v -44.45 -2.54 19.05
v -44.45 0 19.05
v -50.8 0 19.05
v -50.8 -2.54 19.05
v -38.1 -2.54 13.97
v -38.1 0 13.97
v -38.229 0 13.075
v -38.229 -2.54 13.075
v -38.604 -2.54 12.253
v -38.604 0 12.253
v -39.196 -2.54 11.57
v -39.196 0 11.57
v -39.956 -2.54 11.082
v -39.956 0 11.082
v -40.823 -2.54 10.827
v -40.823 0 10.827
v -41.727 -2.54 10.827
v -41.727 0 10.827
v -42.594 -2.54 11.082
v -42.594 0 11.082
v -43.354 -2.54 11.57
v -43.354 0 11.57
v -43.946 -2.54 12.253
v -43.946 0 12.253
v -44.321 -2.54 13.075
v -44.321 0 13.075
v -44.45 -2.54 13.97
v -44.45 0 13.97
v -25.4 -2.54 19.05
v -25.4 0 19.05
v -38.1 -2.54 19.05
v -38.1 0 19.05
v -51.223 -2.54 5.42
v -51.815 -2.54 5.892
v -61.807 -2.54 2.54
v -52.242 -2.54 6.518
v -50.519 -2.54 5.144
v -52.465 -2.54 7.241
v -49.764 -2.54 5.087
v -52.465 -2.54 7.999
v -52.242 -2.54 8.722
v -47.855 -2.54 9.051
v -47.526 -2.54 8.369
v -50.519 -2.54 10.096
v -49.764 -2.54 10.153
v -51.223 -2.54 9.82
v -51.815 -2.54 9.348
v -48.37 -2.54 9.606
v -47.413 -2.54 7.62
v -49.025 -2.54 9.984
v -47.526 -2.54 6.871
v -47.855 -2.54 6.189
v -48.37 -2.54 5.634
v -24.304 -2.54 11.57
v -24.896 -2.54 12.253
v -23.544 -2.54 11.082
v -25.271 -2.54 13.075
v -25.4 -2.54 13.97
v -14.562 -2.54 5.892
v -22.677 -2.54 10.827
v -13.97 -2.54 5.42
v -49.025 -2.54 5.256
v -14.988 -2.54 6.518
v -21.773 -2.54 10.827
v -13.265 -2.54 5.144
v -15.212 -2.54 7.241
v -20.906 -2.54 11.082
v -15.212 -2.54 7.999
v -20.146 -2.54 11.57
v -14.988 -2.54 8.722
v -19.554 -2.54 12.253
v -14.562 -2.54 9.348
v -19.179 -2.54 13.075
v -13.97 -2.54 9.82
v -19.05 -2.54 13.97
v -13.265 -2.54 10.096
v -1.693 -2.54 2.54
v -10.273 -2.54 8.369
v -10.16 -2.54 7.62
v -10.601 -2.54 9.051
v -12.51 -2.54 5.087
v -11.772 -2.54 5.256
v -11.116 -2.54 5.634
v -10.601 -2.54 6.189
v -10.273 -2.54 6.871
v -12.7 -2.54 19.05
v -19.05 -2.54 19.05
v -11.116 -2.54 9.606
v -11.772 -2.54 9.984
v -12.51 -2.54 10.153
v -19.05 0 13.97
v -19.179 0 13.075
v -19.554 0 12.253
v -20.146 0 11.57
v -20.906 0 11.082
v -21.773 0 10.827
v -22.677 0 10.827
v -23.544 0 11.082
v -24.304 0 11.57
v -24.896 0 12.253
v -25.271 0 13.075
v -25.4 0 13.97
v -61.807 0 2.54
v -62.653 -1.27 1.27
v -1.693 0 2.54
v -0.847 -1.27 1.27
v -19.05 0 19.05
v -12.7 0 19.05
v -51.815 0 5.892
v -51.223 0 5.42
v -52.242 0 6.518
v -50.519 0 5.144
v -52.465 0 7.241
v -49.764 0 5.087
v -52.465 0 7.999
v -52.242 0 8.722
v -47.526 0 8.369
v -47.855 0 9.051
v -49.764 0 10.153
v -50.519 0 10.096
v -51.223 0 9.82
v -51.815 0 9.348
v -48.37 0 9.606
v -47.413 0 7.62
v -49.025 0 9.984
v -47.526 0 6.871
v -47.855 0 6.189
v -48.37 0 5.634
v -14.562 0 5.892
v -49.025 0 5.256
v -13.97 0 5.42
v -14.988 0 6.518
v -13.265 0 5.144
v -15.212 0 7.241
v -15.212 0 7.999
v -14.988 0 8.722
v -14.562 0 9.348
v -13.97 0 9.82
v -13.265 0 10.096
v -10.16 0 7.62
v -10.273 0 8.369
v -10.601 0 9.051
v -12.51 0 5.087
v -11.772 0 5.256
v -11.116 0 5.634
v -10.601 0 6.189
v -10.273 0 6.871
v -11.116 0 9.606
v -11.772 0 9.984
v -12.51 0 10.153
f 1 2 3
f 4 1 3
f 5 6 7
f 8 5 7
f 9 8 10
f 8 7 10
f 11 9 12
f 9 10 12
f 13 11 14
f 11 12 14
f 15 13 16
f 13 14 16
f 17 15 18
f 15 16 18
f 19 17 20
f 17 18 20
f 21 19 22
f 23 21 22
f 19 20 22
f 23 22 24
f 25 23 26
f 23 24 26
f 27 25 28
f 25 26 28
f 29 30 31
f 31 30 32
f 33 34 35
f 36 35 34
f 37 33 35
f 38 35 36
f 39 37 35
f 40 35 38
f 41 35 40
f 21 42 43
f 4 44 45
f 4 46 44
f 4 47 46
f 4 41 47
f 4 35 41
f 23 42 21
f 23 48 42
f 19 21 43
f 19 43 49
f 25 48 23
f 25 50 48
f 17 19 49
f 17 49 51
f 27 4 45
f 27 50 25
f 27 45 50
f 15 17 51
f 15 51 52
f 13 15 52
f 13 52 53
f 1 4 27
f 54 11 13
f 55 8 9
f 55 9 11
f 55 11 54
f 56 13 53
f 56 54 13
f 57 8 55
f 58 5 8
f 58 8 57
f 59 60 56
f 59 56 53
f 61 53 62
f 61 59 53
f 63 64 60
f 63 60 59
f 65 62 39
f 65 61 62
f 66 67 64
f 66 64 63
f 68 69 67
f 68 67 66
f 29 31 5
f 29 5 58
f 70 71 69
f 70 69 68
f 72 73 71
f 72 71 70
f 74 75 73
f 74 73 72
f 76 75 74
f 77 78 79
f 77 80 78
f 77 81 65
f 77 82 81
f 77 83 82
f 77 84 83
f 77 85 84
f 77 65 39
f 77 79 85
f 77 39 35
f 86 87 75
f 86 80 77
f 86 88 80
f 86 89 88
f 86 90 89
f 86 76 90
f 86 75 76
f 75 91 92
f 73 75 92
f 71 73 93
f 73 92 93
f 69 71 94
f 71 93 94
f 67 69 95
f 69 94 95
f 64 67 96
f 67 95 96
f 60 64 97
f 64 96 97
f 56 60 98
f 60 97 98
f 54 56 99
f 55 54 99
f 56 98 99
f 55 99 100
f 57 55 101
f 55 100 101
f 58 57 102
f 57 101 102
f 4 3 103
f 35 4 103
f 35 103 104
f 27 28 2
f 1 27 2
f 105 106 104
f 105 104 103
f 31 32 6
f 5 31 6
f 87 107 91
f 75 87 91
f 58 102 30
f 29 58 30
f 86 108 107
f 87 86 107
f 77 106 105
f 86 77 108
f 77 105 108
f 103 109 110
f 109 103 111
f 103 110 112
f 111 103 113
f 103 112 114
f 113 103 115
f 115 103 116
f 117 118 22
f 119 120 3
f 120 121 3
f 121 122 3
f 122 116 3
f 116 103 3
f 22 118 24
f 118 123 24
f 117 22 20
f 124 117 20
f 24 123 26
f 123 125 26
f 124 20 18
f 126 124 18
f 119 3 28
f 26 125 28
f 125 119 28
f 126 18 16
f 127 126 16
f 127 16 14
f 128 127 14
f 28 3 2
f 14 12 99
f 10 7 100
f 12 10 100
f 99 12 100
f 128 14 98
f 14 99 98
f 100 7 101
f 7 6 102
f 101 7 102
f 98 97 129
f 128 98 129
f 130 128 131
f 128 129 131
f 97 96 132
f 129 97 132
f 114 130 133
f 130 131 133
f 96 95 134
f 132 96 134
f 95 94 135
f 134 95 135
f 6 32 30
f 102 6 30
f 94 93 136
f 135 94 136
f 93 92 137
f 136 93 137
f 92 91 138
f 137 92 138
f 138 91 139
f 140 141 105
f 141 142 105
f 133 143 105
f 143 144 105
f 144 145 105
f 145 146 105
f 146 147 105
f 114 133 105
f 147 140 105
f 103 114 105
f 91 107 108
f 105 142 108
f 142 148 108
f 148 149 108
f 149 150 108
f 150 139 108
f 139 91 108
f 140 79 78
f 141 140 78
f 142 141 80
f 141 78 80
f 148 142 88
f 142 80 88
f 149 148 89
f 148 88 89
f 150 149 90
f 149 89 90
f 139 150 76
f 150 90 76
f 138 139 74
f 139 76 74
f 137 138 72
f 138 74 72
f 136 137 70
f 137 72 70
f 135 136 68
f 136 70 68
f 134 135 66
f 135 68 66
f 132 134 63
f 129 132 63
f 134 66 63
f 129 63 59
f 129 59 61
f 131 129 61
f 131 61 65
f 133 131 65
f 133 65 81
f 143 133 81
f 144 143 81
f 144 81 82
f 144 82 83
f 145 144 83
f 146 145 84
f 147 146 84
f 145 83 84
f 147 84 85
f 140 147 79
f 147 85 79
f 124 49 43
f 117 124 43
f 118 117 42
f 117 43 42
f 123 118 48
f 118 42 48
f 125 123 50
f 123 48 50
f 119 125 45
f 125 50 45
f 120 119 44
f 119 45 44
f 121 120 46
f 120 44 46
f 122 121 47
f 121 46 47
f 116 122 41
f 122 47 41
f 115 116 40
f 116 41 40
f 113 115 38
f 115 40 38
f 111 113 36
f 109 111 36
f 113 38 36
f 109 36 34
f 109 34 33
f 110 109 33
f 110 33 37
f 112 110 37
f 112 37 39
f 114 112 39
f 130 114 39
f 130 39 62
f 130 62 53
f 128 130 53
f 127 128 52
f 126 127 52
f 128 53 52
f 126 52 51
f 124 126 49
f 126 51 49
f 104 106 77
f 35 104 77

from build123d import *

# Parameters (mm, degrees)
F1_DEPTH    = 2.54
F2_T1_DEPTH = 76.5641495789
F3_R        = 2.54
F4_DEPTH    = 2.54


# Not quite as in the source:
# - a fillet or chamfer that OpenCascade refuses, or shapes differently, is made with other operations: its cross-section is extruded or revolved along the edge and cut away or added


with BuildPart() as f1:
    # F0 (on Front) → F1 (new body)
    with BuildSketch(Plane.XZ):
        with BuildLine():
            Line((-63.5, 0), (0, 0))
            Line((0, 0), (-12.7, 19.05))
            Line((-12.7, 19.05), (-19.05, 19.05))
            Line((-19.05, 19.05), (-19.05, 13.97))
            ThreePointArc((-19.05, 13.97), (-22.225, 10.795), (-25.4, 13.97))
            Line((-25.4, 13.97), (-25.4, 19.05))
            Line((-25.4, 19.05), (-38.1, 19.05))
            Line((-38.1, 19.05), (-38.1, 13.97))
            ThreePointArc((-38.1, 13.97), (-41.275, 10.795), (-44.45, 13.97))
            Line((-44.45, 13.97), (-44.45, 19.05))
            Line((-44.45, 19.05), (-50.8, 19.05))
            Line((-50.8, 19.05), (-63.5, 0))
        make_face()
    extrude(amount=F1_DEPTH)

    # F2: chamfer of 2.54 on 2 edges, made by hand

    # F2_s2 → F2_t1 (cut)
    with BuildSketch(Plane.YZ.offset(-70.0320747894)):
        Polygon((0, 0), (-2.54, 2.54), (-2.54, 0), align=None)
        Polygon((-2.54, 0), (0, 2.54), (0, 0), align=None)
    extrude(amount=F2_T1_DEPTH, mode=Mode.SUBTRACT)

    # F3 (on face) → F4 (cut)
    with BuildSketch(Plane.XZ.offset(2.54)):
        with Locations((-12.7, 7.62)):
            Circle(F3_R)
        with Locations((-49.9533333333, 7.62)):
            Circle(F3_R)
    extrude(amount=-F4_DEPTH, mode=Mode.SUBTRACT)


solid = f1.part
